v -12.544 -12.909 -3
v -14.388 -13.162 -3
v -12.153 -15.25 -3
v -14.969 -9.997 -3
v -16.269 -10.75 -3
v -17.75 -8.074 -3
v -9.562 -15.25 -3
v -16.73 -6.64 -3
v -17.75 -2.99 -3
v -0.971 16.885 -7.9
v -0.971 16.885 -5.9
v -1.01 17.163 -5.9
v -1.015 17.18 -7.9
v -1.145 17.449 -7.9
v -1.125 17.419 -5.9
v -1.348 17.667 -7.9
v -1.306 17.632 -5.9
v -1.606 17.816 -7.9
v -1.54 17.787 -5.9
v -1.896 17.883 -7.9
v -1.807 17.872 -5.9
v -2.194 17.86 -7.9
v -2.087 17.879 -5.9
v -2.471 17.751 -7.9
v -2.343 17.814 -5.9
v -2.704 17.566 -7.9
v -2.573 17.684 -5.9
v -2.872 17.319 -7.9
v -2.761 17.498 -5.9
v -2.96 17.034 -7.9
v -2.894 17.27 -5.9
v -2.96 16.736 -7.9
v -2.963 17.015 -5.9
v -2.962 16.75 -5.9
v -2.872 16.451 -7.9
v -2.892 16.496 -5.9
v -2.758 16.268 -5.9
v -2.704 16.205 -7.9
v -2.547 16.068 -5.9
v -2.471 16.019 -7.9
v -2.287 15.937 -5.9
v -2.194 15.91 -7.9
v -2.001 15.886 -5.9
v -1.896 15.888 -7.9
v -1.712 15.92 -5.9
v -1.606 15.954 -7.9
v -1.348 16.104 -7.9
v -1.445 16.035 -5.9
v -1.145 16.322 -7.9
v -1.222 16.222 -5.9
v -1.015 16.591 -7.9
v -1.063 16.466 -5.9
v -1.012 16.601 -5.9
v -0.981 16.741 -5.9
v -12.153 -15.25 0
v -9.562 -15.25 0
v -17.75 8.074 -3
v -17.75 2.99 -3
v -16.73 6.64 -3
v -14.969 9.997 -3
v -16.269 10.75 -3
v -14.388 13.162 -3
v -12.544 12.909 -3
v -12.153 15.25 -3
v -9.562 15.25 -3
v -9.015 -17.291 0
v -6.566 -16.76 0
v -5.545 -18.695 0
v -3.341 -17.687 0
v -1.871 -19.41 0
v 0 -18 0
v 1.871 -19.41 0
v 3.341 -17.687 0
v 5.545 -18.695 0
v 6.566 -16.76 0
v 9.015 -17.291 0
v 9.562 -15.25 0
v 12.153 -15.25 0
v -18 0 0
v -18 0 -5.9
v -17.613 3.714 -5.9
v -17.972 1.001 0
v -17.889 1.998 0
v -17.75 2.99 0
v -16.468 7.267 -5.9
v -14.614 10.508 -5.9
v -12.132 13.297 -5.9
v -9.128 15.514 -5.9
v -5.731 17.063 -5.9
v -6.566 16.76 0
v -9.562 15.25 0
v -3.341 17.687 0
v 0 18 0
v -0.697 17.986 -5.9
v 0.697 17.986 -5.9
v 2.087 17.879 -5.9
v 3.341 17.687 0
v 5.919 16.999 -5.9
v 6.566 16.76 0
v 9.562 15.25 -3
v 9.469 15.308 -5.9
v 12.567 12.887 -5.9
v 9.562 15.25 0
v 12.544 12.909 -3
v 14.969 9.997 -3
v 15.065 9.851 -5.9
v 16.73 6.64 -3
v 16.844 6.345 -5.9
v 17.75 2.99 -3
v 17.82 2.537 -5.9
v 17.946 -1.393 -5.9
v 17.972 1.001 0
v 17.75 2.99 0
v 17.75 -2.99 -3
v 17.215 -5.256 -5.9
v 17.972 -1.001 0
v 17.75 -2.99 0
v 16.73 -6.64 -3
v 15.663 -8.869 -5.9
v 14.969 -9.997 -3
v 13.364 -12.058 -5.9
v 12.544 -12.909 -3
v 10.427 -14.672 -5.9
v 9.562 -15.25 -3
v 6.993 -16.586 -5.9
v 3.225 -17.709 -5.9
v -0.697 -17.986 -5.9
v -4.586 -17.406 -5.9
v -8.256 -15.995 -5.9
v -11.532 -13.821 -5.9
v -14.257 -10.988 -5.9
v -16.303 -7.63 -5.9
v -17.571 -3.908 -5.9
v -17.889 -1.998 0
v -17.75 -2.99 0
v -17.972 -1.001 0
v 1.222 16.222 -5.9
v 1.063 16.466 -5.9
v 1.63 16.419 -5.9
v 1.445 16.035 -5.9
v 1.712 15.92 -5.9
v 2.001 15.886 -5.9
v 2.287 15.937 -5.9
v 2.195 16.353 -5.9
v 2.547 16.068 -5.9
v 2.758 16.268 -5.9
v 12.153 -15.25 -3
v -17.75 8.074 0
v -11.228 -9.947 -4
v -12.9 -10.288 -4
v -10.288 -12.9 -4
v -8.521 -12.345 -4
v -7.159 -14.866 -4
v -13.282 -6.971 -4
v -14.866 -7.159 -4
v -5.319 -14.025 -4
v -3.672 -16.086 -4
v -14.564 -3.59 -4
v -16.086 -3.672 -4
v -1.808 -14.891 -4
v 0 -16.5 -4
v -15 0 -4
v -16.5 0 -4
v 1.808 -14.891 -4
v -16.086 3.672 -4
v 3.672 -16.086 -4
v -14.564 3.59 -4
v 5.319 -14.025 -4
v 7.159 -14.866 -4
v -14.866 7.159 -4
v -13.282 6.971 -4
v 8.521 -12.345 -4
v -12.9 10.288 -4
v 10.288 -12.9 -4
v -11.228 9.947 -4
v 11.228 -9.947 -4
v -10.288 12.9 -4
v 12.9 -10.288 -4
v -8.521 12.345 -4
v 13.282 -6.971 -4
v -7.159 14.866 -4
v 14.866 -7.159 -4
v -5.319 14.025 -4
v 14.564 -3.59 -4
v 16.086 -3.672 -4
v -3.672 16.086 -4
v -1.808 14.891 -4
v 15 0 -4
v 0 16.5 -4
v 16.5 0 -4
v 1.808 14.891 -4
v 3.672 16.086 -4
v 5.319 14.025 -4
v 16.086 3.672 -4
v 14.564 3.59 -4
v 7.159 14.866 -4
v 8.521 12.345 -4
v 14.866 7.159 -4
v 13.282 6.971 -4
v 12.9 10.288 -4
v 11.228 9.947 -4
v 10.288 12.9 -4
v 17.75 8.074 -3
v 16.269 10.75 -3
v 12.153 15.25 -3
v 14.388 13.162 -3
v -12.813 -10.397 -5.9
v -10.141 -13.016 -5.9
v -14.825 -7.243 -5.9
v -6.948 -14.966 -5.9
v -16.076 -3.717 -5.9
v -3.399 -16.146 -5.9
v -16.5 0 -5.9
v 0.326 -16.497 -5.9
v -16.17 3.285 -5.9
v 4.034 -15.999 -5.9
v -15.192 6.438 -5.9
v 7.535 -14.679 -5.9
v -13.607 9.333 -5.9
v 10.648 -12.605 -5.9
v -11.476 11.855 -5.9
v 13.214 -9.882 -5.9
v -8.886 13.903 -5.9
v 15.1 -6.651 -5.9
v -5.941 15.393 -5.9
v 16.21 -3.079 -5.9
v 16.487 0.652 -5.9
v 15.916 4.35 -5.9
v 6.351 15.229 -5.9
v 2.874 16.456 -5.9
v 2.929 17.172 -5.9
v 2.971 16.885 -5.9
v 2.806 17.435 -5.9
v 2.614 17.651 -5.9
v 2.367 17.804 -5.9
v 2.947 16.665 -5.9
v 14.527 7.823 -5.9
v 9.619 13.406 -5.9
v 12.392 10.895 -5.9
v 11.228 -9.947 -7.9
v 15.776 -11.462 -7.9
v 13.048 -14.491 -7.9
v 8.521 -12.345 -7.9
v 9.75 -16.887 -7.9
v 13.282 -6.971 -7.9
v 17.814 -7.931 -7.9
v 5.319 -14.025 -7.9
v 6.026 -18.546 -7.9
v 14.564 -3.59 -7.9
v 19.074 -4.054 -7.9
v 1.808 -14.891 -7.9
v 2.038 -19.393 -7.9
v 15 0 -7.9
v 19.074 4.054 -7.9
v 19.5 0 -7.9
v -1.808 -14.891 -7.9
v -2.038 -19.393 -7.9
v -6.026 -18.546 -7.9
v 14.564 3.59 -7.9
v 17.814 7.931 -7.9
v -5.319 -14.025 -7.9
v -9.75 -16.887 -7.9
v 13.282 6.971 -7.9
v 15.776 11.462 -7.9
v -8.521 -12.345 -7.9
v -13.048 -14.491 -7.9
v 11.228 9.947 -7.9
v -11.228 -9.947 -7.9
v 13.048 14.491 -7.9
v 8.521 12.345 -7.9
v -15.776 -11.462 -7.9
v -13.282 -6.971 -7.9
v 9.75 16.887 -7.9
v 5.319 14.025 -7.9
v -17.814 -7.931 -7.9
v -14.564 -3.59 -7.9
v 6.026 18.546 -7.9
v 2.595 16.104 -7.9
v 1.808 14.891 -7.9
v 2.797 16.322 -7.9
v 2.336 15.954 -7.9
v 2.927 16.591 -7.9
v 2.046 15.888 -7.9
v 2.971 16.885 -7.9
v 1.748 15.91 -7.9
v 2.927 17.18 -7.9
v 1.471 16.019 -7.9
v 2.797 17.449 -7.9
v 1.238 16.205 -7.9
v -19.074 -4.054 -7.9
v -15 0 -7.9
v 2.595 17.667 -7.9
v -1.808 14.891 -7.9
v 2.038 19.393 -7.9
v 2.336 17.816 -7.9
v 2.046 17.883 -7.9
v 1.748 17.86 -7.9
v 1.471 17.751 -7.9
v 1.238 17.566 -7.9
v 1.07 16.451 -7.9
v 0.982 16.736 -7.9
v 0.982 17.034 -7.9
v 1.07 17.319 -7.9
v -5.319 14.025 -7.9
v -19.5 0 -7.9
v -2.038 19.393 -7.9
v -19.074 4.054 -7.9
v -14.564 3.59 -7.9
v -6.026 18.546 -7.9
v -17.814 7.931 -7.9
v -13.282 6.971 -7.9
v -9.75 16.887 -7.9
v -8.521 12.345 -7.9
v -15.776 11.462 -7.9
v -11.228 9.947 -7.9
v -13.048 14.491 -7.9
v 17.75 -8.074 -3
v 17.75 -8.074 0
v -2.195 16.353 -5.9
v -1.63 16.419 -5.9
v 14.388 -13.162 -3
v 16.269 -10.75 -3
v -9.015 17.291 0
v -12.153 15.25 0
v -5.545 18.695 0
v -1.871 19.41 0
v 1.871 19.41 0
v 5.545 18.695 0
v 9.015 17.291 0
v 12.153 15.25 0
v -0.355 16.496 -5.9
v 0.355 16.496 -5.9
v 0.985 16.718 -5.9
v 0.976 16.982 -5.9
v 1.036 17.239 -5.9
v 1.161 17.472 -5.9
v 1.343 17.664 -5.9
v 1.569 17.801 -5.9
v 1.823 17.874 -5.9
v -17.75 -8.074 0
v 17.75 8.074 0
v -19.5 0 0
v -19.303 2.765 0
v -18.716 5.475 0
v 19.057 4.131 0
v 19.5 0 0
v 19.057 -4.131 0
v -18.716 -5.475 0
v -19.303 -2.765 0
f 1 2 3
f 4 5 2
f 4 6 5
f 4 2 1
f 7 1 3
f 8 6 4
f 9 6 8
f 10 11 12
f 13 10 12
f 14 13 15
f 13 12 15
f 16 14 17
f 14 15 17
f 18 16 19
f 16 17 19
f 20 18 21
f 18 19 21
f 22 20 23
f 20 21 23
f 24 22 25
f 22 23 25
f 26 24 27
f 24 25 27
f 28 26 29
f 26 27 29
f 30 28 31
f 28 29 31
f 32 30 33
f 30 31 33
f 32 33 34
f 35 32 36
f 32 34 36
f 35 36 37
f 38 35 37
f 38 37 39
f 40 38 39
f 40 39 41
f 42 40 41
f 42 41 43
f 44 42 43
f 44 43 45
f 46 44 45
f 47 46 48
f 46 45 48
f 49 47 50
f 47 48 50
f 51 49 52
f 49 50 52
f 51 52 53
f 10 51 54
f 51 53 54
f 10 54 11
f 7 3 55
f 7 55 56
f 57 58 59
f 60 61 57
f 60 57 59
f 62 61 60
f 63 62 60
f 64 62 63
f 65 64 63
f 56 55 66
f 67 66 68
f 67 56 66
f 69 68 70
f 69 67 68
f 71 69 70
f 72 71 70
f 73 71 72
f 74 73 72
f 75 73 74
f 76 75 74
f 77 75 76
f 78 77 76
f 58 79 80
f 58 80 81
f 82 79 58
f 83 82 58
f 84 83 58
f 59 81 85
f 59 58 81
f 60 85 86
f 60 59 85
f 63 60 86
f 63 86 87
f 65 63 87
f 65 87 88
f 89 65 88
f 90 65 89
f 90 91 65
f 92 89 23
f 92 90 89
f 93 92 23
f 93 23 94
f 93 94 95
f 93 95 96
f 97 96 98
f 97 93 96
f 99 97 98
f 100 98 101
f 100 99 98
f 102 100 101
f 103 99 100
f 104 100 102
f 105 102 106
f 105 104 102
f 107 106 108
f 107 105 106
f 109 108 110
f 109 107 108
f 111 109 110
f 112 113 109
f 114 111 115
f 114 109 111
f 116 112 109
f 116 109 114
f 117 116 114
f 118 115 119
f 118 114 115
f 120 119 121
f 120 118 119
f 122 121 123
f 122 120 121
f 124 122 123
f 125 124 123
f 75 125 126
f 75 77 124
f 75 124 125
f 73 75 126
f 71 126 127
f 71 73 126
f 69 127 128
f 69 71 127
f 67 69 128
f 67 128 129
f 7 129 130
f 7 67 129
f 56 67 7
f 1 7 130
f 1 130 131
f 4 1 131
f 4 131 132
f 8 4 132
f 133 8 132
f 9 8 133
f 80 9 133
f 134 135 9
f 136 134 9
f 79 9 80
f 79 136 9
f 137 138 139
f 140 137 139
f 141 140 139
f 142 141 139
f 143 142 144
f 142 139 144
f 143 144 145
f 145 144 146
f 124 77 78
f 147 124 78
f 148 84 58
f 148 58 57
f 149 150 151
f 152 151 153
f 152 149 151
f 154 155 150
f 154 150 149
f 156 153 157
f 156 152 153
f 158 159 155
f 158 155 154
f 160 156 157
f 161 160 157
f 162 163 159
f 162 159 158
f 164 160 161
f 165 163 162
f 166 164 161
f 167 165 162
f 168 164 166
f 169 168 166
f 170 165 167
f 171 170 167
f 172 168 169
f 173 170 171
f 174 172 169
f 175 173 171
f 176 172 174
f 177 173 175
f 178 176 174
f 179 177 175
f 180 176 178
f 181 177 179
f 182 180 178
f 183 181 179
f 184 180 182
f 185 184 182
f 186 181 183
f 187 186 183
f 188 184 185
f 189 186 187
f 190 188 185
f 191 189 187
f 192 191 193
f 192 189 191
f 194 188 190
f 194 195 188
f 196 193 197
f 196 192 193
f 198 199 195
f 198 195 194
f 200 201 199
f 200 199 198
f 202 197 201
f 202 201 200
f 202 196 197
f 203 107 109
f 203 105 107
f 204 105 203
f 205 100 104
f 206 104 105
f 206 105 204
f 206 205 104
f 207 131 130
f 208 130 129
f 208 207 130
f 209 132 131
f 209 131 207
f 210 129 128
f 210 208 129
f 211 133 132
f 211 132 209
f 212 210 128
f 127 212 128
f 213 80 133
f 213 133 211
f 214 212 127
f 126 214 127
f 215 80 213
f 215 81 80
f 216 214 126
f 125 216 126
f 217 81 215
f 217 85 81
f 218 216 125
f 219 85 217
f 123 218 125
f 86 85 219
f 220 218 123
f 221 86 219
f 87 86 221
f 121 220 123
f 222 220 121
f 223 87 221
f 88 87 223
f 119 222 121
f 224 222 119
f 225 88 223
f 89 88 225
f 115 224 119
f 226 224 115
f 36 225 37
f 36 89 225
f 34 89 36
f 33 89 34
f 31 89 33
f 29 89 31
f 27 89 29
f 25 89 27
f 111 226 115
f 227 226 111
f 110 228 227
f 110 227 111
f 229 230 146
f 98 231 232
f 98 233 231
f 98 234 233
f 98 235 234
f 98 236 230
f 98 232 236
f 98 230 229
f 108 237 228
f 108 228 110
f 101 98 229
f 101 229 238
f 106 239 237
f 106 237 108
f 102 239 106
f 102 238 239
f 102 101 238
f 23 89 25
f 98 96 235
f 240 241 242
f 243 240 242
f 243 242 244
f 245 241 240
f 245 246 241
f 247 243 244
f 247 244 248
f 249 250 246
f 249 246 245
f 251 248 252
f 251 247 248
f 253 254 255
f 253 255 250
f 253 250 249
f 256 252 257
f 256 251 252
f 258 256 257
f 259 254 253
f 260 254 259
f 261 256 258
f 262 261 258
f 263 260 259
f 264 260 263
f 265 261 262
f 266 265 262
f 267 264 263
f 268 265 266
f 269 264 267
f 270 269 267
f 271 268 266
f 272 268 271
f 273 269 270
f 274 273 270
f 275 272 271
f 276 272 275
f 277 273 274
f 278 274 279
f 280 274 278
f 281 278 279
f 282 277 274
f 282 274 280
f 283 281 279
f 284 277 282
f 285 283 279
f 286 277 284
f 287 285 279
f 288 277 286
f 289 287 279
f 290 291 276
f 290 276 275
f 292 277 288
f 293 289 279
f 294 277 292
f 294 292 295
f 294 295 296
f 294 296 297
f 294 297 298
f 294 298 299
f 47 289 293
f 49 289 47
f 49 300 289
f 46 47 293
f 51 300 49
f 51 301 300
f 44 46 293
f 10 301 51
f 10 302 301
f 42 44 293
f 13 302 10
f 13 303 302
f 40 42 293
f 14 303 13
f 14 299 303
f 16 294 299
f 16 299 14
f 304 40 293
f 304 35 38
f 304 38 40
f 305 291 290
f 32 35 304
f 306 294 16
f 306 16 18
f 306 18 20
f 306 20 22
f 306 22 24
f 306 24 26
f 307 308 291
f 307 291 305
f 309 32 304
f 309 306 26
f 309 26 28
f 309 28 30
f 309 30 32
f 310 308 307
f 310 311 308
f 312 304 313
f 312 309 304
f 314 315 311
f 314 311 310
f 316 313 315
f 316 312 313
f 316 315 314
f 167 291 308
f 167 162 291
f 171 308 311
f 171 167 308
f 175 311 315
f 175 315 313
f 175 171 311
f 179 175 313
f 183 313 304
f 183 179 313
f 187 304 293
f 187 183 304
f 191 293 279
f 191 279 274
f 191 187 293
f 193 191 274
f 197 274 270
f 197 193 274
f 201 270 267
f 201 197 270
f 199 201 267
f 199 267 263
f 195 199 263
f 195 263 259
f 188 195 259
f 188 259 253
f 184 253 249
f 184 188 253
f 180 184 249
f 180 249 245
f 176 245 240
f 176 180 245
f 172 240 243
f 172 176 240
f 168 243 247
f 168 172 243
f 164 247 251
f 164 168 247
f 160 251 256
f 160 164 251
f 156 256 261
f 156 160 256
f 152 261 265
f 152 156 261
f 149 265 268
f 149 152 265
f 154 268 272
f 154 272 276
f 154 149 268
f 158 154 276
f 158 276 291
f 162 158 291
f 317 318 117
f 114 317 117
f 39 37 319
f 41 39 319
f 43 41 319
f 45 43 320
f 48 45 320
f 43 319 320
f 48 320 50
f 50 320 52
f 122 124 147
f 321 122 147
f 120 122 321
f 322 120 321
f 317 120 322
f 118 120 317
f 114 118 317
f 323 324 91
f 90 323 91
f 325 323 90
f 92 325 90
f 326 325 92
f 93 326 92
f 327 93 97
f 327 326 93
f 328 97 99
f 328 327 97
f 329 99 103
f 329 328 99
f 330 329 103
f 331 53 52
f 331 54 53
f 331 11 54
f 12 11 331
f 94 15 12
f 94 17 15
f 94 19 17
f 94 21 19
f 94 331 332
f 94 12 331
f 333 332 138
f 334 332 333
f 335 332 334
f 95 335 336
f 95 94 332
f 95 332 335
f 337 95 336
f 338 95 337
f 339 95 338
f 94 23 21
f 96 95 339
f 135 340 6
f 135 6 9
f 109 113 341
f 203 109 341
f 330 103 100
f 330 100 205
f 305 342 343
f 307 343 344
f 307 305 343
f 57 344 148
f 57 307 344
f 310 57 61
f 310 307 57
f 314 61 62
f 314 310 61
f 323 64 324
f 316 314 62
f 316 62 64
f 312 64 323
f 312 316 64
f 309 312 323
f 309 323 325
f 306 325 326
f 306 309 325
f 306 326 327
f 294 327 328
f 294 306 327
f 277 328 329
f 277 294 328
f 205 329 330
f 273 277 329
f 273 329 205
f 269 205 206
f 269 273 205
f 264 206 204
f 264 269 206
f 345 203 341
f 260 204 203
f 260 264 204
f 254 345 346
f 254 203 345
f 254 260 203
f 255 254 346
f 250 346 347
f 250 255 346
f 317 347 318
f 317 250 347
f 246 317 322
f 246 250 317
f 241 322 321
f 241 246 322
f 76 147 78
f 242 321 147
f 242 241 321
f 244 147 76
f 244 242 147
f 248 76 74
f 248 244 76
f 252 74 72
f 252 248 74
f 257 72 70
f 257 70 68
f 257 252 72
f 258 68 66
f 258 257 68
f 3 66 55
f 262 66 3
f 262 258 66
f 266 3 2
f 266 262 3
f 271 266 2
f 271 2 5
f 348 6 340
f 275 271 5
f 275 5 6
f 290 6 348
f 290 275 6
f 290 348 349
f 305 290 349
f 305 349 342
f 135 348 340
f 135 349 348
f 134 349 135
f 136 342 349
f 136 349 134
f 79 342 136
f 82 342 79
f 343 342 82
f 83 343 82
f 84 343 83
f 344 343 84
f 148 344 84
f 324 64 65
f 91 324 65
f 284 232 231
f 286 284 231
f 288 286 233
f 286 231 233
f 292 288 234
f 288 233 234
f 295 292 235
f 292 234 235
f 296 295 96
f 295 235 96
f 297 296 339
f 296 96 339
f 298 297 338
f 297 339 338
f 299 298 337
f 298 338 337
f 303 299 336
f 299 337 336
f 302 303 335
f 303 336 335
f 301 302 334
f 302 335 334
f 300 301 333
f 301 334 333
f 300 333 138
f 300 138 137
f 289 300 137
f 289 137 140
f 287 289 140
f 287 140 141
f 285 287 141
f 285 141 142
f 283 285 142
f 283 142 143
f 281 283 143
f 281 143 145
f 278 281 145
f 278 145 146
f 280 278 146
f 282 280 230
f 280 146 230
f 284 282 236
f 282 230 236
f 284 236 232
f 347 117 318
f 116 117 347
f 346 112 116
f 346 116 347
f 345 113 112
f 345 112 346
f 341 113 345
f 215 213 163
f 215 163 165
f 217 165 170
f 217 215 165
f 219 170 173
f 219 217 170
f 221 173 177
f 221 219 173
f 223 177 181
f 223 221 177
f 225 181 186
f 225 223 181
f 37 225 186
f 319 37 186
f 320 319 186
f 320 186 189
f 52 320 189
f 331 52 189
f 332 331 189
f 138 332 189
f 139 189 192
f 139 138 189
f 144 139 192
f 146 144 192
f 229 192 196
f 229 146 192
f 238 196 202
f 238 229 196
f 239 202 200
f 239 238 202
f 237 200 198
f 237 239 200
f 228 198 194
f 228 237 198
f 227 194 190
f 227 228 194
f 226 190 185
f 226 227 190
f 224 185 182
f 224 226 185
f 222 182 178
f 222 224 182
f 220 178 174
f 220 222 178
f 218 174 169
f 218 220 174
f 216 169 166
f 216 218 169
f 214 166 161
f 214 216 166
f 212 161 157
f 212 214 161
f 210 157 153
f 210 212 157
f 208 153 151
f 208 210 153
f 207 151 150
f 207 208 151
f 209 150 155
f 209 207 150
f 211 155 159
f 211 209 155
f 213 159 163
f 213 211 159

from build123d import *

# Parameters (mm, degrees)
F2_R     = 1
F3_DEPTH = 25
F4_W     = 35.5
F4_H     = 30.5
F5_DEPTH = 3


with BuildPart() as f1:
    # F0 (on Front) → F1 (revolve)
    with BuildSketch(Plane.XZ):
        Polygon((-15, -4), (-16.5, -4), (-16.5, -5.9), (-18, -5.9), (-18, 0), (-19.5, 0), (-19.5, -7.9), (-15, -7.9), align=None)
    revolve(axis=Axis((0, 0, -4.832979), (0, 0, -1)))

    # F2 (on face) → F3 (cut)
    with BuildSketch(Plane.XY.offset(-5.9)):
        with Locations((-1.971014, 16.885352)):
            Circle(F2_R)
        with Locations((1.971014, 16.885352)):
            Circle(F2_R)
    extrude(amount=-F3_DEPTH, mode=Mode.SUBTRACT)

    # F4 (on face) → F5 (cut)
    with BuildSketch(Plane.XY):
        Rectangle(F4_W, F4_H)
    extrude(amount=-F5_DEPTH, mode=Mode.SUBTRACT)


solid = f1.part
